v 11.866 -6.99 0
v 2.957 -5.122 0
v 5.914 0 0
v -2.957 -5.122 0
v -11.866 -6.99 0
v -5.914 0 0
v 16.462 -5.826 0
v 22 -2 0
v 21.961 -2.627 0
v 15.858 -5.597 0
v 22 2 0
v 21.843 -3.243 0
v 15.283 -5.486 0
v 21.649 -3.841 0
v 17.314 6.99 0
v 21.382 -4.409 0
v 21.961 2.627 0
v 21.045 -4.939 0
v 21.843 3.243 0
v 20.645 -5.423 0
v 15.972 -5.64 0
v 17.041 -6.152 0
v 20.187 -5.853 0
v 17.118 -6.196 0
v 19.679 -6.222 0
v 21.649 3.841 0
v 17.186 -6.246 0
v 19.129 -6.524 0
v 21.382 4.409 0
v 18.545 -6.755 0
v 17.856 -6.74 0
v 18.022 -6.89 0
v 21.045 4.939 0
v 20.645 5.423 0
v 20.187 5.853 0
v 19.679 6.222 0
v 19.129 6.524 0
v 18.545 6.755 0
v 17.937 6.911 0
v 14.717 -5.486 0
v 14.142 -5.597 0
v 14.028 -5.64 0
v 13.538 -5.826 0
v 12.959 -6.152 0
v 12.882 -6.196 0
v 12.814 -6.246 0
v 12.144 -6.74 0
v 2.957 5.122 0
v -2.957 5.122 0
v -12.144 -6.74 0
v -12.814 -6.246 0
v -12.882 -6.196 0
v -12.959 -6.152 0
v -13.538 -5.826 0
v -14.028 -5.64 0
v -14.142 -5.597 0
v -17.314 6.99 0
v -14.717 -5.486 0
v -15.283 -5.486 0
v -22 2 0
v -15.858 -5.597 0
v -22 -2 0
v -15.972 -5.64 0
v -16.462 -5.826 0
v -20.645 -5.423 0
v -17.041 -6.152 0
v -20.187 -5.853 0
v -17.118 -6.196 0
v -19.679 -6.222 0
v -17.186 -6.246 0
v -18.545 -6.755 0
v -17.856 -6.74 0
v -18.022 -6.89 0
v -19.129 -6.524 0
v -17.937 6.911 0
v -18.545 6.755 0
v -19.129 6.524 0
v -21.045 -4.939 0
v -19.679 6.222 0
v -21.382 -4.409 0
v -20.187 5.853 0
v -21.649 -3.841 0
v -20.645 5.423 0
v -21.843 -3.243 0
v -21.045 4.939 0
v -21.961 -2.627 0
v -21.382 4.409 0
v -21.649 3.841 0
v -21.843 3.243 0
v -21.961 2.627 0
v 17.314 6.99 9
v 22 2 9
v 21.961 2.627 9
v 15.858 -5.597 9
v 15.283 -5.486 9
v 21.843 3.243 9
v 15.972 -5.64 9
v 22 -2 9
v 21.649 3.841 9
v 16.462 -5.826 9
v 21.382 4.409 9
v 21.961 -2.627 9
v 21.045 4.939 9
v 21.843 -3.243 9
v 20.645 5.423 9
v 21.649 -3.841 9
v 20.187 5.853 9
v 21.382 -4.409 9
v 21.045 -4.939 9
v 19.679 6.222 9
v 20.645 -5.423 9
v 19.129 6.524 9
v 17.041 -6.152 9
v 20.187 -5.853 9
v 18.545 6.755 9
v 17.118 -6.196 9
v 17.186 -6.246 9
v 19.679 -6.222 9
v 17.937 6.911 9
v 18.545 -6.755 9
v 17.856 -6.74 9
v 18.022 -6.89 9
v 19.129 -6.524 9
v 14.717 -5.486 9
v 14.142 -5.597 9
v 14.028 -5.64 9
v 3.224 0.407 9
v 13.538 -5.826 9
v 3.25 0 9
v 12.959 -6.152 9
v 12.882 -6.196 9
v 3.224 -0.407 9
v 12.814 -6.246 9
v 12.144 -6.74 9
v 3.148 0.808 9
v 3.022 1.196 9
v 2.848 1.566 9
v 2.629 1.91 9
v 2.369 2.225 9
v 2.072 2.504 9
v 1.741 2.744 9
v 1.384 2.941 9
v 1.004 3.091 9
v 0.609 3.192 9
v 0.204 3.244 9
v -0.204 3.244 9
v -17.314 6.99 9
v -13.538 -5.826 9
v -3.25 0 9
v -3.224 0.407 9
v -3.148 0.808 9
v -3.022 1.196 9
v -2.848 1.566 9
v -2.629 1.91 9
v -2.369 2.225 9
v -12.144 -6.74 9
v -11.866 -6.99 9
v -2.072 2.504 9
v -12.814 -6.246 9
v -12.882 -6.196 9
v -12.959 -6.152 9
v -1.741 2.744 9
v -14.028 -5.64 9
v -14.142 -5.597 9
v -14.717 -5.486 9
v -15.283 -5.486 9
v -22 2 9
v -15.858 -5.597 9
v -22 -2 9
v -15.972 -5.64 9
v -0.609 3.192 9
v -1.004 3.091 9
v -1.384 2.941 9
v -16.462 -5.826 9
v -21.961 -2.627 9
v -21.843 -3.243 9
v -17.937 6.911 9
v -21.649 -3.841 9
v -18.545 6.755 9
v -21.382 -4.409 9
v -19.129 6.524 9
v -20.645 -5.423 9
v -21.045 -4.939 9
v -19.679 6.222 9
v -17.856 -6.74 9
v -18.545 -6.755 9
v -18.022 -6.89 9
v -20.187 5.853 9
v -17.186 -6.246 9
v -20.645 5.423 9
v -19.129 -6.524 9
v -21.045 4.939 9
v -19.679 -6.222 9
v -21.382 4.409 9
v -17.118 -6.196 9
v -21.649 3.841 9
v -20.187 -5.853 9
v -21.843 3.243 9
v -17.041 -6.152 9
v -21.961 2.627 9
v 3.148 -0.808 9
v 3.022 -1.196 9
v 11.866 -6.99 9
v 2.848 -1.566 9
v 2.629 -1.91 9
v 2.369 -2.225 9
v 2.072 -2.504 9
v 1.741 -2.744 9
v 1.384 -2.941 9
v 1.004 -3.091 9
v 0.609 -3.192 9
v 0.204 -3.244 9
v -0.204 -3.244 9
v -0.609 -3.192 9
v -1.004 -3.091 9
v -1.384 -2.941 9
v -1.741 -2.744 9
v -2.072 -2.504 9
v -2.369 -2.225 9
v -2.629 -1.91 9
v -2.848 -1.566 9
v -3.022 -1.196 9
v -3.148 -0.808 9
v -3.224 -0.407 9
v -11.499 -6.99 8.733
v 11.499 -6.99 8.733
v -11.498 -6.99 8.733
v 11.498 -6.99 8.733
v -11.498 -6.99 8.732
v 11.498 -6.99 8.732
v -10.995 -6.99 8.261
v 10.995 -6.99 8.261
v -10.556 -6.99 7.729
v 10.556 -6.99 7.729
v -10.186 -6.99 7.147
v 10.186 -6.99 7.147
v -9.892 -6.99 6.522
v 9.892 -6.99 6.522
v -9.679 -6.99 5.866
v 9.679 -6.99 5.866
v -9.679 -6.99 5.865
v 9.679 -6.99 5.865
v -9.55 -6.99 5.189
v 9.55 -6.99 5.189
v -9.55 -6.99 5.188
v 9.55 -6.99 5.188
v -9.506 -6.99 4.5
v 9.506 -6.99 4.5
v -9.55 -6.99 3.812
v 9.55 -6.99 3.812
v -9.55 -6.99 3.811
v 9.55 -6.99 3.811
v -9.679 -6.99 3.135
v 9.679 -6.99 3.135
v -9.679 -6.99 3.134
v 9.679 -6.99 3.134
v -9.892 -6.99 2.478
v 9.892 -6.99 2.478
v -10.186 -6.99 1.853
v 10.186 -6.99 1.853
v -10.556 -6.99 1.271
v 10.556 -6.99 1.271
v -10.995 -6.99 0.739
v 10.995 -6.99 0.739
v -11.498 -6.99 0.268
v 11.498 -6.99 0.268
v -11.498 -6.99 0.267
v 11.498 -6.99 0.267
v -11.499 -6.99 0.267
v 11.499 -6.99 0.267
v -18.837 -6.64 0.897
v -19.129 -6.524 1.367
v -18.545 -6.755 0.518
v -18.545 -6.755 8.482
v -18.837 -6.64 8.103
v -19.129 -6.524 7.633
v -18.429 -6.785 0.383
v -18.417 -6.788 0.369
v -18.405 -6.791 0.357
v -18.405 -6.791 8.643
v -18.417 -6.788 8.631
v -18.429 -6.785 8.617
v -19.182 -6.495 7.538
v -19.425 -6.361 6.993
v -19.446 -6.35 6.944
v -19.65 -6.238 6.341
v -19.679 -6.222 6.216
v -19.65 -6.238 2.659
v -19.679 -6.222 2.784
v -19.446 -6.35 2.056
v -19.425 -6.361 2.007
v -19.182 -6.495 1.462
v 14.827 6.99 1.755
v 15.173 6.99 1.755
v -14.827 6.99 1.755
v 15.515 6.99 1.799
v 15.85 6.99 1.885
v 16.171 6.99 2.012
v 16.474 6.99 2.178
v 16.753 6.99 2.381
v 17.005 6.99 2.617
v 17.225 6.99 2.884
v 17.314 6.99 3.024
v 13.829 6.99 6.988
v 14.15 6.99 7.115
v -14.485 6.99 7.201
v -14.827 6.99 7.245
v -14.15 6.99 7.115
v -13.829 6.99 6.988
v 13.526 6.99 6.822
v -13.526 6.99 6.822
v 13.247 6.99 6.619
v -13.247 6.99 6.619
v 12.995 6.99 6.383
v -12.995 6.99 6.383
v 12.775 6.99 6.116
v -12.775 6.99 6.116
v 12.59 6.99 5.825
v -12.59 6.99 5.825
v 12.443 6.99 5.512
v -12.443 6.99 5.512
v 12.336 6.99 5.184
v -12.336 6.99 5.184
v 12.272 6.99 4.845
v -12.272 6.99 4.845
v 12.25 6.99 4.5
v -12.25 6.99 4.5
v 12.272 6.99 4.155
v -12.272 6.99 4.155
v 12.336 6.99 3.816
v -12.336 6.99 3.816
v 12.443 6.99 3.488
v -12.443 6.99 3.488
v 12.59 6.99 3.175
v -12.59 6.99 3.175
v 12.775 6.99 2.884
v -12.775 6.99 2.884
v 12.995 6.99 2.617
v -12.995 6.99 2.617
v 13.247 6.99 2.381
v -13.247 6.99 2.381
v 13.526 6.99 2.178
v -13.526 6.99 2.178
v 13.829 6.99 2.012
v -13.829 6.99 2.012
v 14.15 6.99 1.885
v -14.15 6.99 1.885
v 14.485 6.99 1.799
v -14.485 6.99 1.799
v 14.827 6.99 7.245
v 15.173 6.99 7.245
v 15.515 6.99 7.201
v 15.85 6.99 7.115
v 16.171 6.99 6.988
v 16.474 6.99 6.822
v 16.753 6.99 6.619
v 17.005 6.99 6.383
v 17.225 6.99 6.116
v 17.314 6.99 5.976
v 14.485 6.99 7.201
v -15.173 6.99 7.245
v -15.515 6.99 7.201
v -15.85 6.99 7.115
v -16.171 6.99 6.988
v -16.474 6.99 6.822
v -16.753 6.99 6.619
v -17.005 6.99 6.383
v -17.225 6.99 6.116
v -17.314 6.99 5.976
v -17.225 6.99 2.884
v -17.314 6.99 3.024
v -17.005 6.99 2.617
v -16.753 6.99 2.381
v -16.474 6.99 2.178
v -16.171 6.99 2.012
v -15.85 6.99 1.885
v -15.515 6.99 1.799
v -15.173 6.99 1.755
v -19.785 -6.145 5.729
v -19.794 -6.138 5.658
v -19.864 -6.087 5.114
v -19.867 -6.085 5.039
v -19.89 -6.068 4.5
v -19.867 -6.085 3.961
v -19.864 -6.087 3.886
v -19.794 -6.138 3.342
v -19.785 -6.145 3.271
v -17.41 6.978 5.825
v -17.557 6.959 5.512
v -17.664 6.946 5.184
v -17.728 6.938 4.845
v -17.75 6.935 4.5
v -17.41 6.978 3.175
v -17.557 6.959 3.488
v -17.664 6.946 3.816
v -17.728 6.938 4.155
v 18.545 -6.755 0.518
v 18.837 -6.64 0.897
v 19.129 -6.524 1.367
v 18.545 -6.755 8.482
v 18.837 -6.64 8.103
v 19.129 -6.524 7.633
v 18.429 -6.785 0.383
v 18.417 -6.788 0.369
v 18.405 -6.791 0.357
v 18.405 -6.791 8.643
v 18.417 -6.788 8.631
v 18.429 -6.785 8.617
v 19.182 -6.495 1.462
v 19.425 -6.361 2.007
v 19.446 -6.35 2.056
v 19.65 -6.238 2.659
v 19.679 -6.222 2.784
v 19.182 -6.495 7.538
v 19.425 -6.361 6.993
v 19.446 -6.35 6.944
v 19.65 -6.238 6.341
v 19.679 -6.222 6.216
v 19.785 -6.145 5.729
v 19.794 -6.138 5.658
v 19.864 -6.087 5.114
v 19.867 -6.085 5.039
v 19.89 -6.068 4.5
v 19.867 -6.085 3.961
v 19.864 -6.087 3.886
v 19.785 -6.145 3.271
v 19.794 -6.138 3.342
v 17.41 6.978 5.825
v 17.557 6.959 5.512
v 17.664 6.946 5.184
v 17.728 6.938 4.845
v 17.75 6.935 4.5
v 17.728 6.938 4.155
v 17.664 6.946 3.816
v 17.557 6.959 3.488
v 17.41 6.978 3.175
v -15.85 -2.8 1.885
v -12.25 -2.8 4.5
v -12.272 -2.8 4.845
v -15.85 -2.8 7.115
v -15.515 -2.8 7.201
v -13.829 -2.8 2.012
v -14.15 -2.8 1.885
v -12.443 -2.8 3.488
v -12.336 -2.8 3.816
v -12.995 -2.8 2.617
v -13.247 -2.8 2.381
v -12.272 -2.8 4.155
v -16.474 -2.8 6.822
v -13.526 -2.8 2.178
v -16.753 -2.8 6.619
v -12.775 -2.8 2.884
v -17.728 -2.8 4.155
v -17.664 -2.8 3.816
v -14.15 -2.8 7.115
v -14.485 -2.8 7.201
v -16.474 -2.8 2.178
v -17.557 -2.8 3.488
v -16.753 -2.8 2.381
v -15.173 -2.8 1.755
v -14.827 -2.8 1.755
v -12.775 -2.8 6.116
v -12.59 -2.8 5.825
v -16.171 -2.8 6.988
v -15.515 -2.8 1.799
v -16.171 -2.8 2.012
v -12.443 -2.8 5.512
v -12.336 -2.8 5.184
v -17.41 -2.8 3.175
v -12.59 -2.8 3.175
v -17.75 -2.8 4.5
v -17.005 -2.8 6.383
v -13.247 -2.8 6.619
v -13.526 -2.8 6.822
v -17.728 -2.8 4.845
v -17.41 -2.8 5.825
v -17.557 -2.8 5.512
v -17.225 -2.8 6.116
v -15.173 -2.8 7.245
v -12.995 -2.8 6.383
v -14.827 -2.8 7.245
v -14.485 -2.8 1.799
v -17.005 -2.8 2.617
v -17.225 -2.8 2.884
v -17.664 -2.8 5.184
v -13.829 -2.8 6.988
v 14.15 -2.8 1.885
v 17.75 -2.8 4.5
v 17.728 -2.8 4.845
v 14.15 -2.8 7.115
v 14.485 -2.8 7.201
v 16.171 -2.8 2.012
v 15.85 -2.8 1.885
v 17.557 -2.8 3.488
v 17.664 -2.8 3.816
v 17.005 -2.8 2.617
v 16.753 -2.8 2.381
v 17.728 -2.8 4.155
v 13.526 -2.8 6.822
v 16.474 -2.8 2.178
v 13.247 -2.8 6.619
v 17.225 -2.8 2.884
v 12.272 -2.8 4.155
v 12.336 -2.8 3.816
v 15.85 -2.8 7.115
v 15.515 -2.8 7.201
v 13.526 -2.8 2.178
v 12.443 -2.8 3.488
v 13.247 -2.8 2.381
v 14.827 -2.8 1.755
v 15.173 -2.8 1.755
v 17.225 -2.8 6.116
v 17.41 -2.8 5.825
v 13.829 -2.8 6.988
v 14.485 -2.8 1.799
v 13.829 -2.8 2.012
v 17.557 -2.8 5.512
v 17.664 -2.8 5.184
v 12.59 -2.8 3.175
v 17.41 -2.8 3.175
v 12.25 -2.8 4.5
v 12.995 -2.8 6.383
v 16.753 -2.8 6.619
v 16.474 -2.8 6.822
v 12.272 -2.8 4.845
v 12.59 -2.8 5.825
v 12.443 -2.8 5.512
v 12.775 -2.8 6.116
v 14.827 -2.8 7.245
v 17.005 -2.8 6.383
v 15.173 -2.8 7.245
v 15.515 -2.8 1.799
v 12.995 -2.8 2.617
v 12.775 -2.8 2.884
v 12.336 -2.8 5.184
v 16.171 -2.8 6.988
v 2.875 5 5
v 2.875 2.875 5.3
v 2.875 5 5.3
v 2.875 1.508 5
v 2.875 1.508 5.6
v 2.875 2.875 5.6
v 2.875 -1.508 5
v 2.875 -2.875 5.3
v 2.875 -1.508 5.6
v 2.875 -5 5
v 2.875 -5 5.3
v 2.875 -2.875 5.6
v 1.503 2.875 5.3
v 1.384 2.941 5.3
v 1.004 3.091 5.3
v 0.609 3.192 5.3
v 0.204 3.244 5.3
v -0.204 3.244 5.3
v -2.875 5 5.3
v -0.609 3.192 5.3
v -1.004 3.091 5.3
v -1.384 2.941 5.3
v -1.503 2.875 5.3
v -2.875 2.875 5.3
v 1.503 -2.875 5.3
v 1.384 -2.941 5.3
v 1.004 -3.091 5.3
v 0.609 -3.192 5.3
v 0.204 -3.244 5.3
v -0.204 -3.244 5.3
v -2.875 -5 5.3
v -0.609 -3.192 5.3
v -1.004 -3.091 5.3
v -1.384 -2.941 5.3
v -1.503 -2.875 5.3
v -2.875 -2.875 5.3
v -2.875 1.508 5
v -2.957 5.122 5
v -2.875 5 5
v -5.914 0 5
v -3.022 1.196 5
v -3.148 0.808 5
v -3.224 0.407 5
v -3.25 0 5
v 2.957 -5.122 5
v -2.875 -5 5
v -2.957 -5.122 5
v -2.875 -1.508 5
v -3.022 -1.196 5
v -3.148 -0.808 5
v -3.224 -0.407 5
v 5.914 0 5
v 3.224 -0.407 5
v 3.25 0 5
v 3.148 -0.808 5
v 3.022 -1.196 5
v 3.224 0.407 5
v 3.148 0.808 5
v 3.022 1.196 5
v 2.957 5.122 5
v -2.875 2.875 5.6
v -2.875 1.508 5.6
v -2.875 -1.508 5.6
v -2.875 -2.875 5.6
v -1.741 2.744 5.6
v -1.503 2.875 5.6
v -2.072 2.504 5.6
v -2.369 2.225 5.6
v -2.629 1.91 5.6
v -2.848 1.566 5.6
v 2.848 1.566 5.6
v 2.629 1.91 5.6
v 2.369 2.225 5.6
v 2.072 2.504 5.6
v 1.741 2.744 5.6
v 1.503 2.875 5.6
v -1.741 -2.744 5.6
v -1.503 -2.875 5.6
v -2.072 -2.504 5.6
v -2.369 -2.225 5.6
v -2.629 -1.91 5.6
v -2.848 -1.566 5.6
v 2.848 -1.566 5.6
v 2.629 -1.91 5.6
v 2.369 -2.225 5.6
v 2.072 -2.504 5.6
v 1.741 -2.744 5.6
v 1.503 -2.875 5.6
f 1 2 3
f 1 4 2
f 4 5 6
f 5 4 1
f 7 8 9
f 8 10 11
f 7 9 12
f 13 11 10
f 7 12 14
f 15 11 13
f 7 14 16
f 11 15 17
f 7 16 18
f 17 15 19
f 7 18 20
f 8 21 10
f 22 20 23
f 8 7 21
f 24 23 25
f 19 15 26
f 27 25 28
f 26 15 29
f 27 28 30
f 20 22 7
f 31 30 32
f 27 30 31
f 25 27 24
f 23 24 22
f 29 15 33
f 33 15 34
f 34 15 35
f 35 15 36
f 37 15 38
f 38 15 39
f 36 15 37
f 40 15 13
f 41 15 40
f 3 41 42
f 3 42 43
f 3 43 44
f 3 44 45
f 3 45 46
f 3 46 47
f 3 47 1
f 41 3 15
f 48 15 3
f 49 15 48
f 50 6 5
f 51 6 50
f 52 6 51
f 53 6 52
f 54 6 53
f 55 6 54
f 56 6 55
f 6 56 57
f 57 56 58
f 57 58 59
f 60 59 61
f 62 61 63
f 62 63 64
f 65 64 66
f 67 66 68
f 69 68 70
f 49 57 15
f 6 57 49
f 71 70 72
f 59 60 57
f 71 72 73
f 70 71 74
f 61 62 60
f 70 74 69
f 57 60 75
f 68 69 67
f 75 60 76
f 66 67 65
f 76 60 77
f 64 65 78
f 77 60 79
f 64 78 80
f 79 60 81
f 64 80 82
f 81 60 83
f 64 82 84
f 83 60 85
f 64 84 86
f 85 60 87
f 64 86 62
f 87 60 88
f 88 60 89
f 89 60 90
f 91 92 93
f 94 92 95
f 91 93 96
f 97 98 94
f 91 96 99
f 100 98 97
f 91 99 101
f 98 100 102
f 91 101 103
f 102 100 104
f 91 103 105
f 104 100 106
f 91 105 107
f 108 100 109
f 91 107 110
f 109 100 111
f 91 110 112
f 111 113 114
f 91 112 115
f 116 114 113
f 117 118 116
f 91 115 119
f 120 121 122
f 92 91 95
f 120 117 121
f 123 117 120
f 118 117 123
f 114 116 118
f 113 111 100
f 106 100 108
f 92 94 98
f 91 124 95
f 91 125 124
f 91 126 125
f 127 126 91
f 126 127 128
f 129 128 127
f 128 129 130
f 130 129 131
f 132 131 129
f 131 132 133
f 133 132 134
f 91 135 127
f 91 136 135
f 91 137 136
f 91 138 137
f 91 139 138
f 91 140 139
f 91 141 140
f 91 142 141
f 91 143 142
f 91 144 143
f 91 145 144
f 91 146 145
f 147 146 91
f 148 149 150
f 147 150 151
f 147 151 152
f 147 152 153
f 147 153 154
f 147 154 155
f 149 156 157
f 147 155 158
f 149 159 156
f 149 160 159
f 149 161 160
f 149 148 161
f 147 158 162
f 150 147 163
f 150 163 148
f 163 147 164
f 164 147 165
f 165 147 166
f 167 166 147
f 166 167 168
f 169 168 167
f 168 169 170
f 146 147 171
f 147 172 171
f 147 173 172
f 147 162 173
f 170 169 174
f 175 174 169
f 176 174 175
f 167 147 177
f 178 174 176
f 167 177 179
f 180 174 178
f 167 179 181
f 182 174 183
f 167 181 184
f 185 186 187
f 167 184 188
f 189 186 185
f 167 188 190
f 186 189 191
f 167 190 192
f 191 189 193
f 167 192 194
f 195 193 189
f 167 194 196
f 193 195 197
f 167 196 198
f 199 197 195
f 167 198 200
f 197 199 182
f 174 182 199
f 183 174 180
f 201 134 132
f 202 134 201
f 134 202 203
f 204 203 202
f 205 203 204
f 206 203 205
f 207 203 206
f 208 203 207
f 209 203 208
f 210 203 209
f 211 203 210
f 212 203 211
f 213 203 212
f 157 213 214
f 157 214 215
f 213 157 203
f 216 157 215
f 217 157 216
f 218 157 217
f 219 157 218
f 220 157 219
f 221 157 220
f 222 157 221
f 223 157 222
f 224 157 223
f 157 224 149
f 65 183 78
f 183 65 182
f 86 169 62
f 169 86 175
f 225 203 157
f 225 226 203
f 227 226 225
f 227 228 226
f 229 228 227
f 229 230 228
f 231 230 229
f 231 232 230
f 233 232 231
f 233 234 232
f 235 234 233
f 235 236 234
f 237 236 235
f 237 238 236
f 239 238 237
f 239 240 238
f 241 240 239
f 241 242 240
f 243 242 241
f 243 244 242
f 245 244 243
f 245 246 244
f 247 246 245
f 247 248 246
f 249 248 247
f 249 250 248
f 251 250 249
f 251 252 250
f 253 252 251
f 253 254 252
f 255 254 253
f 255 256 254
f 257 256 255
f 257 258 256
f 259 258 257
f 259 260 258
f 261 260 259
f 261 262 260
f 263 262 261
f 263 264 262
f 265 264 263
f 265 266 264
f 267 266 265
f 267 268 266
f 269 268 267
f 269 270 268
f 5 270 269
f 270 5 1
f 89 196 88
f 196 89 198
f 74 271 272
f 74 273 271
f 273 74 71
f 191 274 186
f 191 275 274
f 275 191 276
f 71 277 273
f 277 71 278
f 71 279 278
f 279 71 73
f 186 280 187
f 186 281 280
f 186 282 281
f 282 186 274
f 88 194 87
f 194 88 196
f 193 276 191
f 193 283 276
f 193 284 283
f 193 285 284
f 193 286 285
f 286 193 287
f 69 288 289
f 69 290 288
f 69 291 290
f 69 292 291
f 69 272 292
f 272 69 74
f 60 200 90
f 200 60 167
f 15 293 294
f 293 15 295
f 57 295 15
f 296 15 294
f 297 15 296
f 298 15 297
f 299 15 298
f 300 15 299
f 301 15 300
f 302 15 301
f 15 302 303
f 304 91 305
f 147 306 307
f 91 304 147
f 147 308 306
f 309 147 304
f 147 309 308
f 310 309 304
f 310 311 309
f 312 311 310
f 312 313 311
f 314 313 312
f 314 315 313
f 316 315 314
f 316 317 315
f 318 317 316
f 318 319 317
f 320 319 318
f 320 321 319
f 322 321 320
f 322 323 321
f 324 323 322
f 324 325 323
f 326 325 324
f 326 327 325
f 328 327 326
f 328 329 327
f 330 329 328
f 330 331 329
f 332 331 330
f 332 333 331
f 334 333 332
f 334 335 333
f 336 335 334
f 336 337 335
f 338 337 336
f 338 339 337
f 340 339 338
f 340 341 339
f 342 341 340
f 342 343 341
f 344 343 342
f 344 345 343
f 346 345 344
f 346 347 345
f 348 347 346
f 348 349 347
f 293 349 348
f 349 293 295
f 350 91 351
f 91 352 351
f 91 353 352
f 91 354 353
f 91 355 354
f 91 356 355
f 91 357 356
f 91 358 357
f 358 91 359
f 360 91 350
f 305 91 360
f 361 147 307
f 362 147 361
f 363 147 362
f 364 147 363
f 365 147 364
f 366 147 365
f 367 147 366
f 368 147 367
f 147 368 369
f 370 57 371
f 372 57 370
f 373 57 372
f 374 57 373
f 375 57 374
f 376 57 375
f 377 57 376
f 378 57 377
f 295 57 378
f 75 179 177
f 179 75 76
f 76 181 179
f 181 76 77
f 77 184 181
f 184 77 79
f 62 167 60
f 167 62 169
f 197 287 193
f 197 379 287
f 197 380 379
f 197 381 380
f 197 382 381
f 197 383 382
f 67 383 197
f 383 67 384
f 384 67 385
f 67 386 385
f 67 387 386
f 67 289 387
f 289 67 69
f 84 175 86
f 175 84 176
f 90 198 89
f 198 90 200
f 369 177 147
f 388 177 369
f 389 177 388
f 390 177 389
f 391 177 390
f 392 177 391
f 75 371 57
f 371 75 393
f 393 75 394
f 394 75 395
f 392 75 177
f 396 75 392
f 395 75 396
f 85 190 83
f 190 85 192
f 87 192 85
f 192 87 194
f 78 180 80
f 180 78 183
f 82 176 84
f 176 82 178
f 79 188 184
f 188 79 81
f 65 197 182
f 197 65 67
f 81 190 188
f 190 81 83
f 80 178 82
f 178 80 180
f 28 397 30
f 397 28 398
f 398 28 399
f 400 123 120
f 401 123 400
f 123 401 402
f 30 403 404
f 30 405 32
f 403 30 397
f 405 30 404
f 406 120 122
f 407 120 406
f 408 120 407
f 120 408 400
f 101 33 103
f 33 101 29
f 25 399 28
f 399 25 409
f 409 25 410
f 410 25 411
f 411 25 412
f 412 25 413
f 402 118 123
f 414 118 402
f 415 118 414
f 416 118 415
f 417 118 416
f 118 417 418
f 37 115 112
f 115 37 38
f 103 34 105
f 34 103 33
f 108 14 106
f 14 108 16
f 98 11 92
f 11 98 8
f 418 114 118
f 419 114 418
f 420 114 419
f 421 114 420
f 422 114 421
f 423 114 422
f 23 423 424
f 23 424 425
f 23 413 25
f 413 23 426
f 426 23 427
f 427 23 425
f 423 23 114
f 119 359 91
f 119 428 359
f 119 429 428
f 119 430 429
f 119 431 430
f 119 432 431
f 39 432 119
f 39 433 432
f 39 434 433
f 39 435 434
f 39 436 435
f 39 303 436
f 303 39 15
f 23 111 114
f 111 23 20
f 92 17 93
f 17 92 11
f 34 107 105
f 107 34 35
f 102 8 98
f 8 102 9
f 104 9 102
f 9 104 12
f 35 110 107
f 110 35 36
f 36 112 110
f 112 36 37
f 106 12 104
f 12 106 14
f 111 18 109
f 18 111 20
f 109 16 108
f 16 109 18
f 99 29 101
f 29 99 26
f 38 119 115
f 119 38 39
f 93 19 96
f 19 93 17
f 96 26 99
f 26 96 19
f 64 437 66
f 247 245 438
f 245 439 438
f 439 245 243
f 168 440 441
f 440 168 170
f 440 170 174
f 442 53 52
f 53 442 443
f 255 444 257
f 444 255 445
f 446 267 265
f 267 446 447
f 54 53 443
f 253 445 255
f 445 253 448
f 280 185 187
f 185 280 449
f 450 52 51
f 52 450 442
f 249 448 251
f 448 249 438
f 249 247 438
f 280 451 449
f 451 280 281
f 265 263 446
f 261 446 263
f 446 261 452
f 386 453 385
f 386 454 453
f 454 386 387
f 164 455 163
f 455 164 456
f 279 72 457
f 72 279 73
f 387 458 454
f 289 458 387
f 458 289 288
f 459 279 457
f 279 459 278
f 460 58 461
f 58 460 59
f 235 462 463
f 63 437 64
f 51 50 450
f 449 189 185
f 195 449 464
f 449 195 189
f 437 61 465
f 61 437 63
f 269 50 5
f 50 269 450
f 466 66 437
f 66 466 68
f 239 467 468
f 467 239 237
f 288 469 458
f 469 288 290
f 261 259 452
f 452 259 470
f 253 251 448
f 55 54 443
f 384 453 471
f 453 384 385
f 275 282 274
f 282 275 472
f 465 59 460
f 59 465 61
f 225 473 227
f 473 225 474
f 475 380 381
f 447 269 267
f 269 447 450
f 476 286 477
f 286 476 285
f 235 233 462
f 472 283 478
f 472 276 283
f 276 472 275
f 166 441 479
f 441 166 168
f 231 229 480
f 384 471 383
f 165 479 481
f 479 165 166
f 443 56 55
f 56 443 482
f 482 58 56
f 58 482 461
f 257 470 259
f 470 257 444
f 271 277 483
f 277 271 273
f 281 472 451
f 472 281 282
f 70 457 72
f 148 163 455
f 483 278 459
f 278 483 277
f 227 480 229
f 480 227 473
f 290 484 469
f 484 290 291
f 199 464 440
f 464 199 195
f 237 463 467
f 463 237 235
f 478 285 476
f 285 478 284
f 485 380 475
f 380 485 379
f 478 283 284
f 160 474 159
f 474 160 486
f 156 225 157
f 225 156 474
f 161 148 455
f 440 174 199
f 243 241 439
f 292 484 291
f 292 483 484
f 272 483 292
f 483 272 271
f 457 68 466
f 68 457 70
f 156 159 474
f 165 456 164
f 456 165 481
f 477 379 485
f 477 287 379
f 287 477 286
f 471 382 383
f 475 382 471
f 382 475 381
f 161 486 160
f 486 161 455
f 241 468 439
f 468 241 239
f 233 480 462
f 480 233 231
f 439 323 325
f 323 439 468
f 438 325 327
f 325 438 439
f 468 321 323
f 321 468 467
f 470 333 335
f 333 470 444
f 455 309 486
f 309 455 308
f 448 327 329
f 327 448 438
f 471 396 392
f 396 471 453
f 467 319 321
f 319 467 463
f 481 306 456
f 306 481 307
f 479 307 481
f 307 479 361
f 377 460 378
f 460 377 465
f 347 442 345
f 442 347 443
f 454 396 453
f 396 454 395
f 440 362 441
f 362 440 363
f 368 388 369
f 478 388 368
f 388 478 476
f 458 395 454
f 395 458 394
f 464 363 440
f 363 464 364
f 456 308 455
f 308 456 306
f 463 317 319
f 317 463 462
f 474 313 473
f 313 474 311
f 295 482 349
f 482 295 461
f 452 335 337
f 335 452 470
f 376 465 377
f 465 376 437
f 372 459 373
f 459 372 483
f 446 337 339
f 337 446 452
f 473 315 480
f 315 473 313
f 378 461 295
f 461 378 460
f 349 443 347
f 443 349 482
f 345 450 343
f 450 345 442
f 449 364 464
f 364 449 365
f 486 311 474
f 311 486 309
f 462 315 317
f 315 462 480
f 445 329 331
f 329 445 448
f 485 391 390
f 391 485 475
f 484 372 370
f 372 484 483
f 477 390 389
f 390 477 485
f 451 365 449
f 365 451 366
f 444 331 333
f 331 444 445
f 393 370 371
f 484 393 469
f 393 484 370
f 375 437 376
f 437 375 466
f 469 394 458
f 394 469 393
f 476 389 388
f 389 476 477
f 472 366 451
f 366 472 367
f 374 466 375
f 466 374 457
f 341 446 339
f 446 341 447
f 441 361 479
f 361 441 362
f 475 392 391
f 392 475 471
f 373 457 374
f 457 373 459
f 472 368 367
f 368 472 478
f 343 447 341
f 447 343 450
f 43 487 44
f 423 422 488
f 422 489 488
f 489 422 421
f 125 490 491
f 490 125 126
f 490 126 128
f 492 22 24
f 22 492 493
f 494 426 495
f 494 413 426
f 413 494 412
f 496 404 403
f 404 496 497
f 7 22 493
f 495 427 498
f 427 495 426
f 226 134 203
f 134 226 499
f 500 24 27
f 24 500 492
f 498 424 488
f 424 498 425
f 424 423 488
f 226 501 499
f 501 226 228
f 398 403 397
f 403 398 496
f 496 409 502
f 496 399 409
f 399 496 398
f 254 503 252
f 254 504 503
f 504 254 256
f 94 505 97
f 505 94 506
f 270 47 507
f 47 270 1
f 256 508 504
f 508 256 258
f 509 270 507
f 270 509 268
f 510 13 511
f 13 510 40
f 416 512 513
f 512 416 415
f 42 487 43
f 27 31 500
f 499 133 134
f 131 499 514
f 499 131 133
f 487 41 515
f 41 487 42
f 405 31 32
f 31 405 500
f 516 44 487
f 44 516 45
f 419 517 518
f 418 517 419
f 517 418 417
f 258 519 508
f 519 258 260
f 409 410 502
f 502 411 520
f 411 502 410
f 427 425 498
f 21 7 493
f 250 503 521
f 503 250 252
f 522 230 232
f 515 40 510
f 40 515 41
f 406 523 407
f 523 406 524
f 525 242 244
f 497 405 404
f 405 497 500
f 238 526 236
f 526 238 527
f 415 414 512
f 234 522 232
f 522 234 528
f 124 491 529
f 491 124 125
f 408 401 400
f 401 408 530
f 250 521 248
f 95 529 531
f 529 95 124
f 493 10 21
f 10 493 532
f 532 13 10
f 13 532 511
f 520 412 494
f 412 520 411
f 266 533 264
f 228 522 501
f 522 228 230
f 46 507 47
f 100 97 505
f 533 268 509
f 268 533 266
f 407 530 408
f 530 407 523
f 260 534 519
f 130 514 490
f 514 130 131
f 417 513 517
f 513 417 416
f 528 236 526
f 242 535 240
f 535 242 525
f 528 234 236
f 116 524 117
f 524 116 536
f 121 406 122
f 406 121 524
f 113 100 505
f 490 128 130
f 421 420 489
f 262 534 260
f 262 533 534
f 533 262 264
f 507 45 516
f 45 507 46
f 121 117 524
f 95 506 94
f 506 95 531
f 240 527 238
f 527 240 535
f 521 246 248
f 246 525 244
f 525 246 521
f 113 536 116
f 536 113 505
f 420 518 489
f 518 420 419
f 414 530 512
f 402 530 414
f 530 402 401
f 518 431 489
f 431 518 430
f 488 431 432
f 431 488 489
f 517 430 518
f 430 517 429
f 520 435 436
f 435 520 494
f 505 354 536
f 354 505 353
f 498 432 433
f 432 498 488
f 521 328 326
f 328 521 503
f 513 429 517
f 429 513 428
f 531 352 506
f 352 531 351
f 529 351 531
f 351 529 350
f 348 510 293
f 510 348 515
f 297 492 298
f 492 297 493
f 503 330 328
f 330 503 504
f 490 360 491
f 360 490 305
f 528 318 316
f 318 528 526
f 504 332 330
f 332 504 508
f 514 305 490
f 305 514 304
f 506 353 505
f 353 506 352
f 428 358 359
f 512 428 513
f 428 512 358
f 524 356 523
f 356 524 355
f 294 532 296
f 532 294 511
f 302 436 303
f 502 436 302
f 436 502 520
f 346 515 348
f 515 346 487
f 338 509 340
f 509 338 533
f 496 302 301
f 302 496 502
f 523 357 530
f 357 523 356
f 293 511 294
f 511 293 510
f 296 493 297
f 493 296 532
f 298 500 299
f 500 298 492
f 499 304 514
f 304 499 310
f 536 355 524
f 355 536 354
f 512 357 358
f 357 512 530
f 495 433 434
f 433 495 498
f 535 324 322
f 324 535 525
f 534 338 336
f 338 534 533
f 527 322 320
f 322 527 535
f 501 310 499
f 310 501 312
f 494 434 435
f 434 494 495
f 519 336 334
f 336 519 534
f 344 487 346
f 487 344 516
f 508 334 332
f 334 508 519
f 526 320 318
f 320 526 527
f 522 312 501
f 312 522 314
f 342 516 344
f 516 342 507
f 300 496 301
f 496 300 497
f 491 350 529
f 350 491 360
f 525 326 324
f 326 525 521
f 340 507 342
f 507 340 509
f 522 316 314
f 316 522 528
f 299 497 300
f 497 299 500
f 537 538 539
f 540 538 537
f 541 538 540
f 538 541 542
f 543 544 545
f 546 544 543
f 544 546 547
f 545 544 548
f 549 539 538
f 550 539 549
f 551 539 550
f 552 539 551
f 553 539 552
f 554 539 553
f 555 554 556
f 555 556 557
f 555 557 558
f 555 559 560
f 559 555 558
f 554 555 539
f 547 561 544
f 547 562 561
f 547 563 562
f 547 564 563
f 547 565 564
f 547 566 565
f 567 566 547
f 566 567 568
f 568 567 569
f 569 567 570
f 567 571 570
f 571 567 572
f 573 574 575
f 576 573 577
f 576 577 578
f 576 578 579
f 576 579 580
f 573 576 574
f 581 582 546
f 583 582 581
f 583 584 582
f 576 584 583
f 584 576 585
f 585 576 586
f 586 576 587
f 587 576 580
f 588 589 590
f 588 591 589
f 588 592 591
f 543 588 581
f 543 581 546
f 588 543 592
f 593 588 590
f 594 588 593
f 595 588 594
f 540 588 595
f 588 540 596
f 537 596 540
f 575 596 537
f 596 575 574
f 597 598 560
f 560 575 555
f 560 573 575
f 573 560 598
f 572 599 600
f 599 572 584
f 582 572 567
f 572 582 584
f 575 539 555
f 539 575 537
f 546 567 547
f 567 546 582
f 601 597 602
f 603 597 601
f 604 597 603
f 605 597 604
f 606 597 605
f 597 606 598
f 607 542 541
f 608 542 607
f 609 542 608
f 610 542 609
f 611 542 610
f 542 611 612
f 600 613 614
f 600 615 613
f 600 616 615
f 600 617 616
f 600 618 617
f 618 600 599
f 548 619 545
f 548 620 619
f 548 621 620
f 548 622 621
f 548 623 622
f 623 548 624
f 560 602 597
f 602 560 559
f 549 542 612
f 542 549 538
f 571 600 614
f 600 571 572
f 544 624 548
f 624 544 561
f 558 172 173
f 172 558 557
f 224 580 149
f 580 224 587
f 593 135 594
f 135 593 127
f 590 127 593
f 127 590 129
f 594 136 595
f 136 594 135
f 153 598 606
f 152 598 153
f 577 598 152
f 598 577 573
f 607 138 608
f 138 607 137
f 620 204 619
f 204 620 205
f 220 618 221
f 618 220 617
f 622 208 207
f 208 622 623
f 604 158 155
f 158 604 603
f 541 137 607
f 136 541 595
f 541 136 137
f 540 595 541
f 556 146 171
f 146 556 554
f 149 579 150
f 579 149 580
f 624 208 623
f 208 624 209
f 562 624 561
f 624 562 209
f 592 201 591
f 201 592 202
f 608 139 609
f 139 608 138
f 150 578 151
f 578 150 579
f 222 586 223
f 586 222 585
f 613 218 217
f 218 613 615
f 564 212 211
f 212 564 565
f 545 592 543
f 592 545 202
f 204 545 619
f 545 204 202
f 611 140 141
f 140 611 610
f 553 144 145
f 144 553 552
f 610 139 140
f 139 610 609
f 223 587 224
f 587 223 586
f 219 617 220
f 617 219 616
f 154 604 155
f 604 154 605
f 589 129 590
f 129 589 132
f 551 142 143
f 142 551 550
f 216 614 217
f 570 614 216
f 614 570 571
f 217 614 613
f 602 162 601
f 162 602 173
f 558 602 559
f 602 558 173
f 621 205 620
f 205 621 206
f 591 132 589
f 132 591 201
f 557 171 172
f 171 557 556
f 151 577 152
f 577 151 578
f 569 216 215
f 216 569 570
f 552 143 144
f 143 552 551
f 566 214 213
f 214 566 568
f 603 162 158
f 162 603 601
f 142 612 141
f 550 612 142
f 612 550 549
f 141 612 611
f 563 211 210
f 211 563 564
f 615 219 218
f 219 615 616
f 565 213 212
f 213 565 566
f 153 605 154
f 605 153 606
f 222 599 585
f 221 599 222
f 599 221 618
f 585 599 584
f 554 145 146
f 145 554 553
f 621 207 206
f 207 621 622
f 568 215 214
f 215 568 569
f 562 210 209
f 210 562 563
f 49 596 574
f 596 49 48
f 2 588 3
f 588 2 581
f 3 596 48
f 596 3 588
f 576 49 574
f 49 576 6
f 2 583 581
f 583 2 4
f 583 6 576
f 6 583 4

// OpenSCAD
$fn = 50;


difference() {
	union() {
		cylinder(h = 9, r = 7.0000000000);
		translate(v = [-7.5000000000, 0.0000000000, 0]) {
			hull() {
				translate(v = [-9.5000000000, 2.0000000000, 0]) {
					cylinder(h = 9, r = 5);
				}
				translate(v = [9.5000000000, 2.0000000000, 0]) {
					cylinder(h = 9, r = 5);
				}
				translate(v = [-9.5000000000, -2.0000000000, 0]) {
					cylinder(h = 9, r = 5);
				}
				translate(v = [9.5000000000, -2.0000000000, 0]) {
					cylinder(h = 9, r = 5);
				}
			}
		}
		translate(v = [-7.5000000000, 0.0000000000, 0]) {
			hull() {
				translate(v = [-9.5000000000, 2.0000000000, 0]) {
					cylinder(h = 9, r = 5);
				}
				translate(v = [9.5000000000, 2.0000000000, 0]) {
					cylinder(h = 9, r = 5);
				}
				translate(v = [-9.5000000000, -2.0000000000, 0]) {
					cylinder(h = 9, r = 5);
				}
				translate(v = [9.5000000000, -2.0000000000, 0]) {
					cylinder(h = 9, r = 5);
				}
			}
		}
		translate(v = [7.5000000000, 0.0000000000, 0]) {
			hull() {
				translate(v = [-9.5000000000, 2.0000000000, 0]) {
					cylinder(h = 9, r = 5);
				}
				translate(v = [9.5000000000, 2.0000000000, 0]) {
					cylinder(h = 9, r = 5);
				}
				translate(v = [-9.5000000000, -2.0000000000, 0]) {
					cylinder(h = 9, r = 5);
				}
				translate(v = [9.5000000000, -2.0000000000, 0]) {
					cylinder(h = 9, r = 5);
				}
			}
		}
		translate(v = [7.5000000000, 0.0000000000, 0]) {
			hull() {
				translate(v = [-9.5000000000, 2.0000000000, 0]) {
					cylinder(h = 9, r = 5);
				}
				translate(v = [9.5000000000, 2.0000000000, 0]) {
					cylinder(h = 9, r = 5);
				}
				translate(v = [-9.5000000000, -2.0000000000, 0]) {
					cylinder(h = 9, r = 5);
				}
				translate(v = [9.5000000000, -2.0000000000, 0]) {
					cylinder(h = 9, r = 5);
				}
			}
		}
	}
	union() {
		translate(v = [-15.0000000000, -7.0000000000, 4.5000000000]) {
			rotate(a = [90, 0, 0]) {
				difference() {
					union() {
						#translate(v = [0, 0, -14.0000000000]) {
							cylinder(h = 14, r = 2.2500000000);
						}
						#translate(v = [0, 0, -4.2000000000]) {
							cylinder(h = 4.2000000000, r1 = 2.7500000000, r2 = 5.5000000000);
						}
						#translate(v = [0, 0, -14.0000000000]) {
							cylinder(h = 14, r = 2.7500000000);
						}
						#translate(v = [0, 0, -14.0000000000]) {
							cylinder(h = 14, r = 2.2500000000);
						}
					}
					union();
				}
			}
		}
		translate(v = [15.0000000000, -7.0000000000, 4.5000000000]) {
			rotate(a = [90, 0, 0]) {
				difference() {
					union() {
						#translate(v = [0, 0, -14.0000000000]) {
							cylinder(h = 14, r = 2.2500000000);
						}
						#translate(v = [0, 0, -4.2000000000]) {
							cylinder(h = 4.2000000000, r1 = 2.7500000000, r2 = 5.5000000000);
						}
						#translate(v = [0, 0, -14.0000000000]) {
							cylinder(h = 14, r = 2.7500000000);
						}
						#translate(v = [0, 0, -14.0000000000]) {
							cylinder(h = 14, r = 2.2500000000);
						}
					}
					union();
				}
			}
		}
		translate(v = [0.0000000000, 0.0000000000, 0]) {
			rotate(a = [0, 0, 0]) {
				difference() {
					union() {
						#translate(v = [-2.8750000000, -5.0000000000, -0.3000000000]) {
							cube(size = [5.7500000000, 10, 0.3000000000]);
						}
						#translate(v = [-2.8750000000, -2.8750000000, -0.6000000000]) {
							cube(size = [5.7500000000, 5.7500000000, 0.3000000000]);
						}
						#translate(v = [-2.8750000000, -5.0000000000, 5]) {
							cube(size = [5.7500000000, 10, 0.3000000000]);
						}
						#translate(v = [-2.8750000000, -2.8750000000, 5.3000000000]) {
							cube(size = [5.7500000000, 5.7500000000, 0.3000000000]);
						}
						#translate(v = [0, 0, -100.0000000000]) {
							cylinder(h = 200, r = 3.2500000000);
						}
						#linear_extrude(height = 5) {
							polygon(points = [[5.9142500000, 0.0000000000], [2.9571250000, 5.1218907443], [-2.9571250000, 5.1218907443], [-5.9142500000, 0.0000000000], [-2.9571250000, -5.1218907443], [2.9571250000, -5.1218907443]]);
						}
						#translate(v = [-2.8750000000, -5.0000000000, -0.3000000000]) {
							cube(size = [5.7500000000, 10, 0.3000000000]);
						}
						#translate(v = [-2.8750000000, -2.8750000000, -0.6000000000]) {
							cube(size = [5.7500000000, 5.7500000000, 0.3000000000]);
						}
						#translate(v = [-2.8750000000, -5.0000000000, 5]) {
							cube(size = [5.7500000000, 10, 0.3000000000]);
						}
						#translate(v = [-2.8750000000, -2.8750000000, 5.3000000000]) {
							cube(size = [5.7500000000, 5.7500000000, 0.3000000000]);
						}
						#translate(v = [0, 0, -100.0000000000]) {
							cylinder(h = 200, r = 3.2500000000);
						}
						#translate(v = [-2.8750000000, -5.0000000000, -0.3000000000]) {
							cube(size = [5.7500000000, 10, 0.3000000000]);
						}
						#translate(v = [-2.8750000000, -2.8750000000, -0.6000000000]) {
							cube(size = [5.7500000000, 5.7500000000, 0.3000000000]);
						}
						#translate(v = [-2.8750000000, -5.0000000000, 5]) {
							cube(size = [5.7500000000, 10, 0.3000000000]);
						}
						#translate(v = [-2.8750000000, -2.8750000000, 5.3000000000]) {
							cube(size = [5.7500000000, 5.7500000000, 0.3000000000]);
						}
						#translate(v = [0, 0, -100.0000000000]) {
							cylinder(h = 200, r = 3.2500000000);
						}
					}
					union();
				}
			}
		}
		translate(v = [0, 0, -100]) {
			cylinder(h = 200, r = 3.2500000000);
		}
		translate(v = [0, 0, -100]) {
			cylinder(h = 200, r = 1.8000000000);
		}
	}
}
